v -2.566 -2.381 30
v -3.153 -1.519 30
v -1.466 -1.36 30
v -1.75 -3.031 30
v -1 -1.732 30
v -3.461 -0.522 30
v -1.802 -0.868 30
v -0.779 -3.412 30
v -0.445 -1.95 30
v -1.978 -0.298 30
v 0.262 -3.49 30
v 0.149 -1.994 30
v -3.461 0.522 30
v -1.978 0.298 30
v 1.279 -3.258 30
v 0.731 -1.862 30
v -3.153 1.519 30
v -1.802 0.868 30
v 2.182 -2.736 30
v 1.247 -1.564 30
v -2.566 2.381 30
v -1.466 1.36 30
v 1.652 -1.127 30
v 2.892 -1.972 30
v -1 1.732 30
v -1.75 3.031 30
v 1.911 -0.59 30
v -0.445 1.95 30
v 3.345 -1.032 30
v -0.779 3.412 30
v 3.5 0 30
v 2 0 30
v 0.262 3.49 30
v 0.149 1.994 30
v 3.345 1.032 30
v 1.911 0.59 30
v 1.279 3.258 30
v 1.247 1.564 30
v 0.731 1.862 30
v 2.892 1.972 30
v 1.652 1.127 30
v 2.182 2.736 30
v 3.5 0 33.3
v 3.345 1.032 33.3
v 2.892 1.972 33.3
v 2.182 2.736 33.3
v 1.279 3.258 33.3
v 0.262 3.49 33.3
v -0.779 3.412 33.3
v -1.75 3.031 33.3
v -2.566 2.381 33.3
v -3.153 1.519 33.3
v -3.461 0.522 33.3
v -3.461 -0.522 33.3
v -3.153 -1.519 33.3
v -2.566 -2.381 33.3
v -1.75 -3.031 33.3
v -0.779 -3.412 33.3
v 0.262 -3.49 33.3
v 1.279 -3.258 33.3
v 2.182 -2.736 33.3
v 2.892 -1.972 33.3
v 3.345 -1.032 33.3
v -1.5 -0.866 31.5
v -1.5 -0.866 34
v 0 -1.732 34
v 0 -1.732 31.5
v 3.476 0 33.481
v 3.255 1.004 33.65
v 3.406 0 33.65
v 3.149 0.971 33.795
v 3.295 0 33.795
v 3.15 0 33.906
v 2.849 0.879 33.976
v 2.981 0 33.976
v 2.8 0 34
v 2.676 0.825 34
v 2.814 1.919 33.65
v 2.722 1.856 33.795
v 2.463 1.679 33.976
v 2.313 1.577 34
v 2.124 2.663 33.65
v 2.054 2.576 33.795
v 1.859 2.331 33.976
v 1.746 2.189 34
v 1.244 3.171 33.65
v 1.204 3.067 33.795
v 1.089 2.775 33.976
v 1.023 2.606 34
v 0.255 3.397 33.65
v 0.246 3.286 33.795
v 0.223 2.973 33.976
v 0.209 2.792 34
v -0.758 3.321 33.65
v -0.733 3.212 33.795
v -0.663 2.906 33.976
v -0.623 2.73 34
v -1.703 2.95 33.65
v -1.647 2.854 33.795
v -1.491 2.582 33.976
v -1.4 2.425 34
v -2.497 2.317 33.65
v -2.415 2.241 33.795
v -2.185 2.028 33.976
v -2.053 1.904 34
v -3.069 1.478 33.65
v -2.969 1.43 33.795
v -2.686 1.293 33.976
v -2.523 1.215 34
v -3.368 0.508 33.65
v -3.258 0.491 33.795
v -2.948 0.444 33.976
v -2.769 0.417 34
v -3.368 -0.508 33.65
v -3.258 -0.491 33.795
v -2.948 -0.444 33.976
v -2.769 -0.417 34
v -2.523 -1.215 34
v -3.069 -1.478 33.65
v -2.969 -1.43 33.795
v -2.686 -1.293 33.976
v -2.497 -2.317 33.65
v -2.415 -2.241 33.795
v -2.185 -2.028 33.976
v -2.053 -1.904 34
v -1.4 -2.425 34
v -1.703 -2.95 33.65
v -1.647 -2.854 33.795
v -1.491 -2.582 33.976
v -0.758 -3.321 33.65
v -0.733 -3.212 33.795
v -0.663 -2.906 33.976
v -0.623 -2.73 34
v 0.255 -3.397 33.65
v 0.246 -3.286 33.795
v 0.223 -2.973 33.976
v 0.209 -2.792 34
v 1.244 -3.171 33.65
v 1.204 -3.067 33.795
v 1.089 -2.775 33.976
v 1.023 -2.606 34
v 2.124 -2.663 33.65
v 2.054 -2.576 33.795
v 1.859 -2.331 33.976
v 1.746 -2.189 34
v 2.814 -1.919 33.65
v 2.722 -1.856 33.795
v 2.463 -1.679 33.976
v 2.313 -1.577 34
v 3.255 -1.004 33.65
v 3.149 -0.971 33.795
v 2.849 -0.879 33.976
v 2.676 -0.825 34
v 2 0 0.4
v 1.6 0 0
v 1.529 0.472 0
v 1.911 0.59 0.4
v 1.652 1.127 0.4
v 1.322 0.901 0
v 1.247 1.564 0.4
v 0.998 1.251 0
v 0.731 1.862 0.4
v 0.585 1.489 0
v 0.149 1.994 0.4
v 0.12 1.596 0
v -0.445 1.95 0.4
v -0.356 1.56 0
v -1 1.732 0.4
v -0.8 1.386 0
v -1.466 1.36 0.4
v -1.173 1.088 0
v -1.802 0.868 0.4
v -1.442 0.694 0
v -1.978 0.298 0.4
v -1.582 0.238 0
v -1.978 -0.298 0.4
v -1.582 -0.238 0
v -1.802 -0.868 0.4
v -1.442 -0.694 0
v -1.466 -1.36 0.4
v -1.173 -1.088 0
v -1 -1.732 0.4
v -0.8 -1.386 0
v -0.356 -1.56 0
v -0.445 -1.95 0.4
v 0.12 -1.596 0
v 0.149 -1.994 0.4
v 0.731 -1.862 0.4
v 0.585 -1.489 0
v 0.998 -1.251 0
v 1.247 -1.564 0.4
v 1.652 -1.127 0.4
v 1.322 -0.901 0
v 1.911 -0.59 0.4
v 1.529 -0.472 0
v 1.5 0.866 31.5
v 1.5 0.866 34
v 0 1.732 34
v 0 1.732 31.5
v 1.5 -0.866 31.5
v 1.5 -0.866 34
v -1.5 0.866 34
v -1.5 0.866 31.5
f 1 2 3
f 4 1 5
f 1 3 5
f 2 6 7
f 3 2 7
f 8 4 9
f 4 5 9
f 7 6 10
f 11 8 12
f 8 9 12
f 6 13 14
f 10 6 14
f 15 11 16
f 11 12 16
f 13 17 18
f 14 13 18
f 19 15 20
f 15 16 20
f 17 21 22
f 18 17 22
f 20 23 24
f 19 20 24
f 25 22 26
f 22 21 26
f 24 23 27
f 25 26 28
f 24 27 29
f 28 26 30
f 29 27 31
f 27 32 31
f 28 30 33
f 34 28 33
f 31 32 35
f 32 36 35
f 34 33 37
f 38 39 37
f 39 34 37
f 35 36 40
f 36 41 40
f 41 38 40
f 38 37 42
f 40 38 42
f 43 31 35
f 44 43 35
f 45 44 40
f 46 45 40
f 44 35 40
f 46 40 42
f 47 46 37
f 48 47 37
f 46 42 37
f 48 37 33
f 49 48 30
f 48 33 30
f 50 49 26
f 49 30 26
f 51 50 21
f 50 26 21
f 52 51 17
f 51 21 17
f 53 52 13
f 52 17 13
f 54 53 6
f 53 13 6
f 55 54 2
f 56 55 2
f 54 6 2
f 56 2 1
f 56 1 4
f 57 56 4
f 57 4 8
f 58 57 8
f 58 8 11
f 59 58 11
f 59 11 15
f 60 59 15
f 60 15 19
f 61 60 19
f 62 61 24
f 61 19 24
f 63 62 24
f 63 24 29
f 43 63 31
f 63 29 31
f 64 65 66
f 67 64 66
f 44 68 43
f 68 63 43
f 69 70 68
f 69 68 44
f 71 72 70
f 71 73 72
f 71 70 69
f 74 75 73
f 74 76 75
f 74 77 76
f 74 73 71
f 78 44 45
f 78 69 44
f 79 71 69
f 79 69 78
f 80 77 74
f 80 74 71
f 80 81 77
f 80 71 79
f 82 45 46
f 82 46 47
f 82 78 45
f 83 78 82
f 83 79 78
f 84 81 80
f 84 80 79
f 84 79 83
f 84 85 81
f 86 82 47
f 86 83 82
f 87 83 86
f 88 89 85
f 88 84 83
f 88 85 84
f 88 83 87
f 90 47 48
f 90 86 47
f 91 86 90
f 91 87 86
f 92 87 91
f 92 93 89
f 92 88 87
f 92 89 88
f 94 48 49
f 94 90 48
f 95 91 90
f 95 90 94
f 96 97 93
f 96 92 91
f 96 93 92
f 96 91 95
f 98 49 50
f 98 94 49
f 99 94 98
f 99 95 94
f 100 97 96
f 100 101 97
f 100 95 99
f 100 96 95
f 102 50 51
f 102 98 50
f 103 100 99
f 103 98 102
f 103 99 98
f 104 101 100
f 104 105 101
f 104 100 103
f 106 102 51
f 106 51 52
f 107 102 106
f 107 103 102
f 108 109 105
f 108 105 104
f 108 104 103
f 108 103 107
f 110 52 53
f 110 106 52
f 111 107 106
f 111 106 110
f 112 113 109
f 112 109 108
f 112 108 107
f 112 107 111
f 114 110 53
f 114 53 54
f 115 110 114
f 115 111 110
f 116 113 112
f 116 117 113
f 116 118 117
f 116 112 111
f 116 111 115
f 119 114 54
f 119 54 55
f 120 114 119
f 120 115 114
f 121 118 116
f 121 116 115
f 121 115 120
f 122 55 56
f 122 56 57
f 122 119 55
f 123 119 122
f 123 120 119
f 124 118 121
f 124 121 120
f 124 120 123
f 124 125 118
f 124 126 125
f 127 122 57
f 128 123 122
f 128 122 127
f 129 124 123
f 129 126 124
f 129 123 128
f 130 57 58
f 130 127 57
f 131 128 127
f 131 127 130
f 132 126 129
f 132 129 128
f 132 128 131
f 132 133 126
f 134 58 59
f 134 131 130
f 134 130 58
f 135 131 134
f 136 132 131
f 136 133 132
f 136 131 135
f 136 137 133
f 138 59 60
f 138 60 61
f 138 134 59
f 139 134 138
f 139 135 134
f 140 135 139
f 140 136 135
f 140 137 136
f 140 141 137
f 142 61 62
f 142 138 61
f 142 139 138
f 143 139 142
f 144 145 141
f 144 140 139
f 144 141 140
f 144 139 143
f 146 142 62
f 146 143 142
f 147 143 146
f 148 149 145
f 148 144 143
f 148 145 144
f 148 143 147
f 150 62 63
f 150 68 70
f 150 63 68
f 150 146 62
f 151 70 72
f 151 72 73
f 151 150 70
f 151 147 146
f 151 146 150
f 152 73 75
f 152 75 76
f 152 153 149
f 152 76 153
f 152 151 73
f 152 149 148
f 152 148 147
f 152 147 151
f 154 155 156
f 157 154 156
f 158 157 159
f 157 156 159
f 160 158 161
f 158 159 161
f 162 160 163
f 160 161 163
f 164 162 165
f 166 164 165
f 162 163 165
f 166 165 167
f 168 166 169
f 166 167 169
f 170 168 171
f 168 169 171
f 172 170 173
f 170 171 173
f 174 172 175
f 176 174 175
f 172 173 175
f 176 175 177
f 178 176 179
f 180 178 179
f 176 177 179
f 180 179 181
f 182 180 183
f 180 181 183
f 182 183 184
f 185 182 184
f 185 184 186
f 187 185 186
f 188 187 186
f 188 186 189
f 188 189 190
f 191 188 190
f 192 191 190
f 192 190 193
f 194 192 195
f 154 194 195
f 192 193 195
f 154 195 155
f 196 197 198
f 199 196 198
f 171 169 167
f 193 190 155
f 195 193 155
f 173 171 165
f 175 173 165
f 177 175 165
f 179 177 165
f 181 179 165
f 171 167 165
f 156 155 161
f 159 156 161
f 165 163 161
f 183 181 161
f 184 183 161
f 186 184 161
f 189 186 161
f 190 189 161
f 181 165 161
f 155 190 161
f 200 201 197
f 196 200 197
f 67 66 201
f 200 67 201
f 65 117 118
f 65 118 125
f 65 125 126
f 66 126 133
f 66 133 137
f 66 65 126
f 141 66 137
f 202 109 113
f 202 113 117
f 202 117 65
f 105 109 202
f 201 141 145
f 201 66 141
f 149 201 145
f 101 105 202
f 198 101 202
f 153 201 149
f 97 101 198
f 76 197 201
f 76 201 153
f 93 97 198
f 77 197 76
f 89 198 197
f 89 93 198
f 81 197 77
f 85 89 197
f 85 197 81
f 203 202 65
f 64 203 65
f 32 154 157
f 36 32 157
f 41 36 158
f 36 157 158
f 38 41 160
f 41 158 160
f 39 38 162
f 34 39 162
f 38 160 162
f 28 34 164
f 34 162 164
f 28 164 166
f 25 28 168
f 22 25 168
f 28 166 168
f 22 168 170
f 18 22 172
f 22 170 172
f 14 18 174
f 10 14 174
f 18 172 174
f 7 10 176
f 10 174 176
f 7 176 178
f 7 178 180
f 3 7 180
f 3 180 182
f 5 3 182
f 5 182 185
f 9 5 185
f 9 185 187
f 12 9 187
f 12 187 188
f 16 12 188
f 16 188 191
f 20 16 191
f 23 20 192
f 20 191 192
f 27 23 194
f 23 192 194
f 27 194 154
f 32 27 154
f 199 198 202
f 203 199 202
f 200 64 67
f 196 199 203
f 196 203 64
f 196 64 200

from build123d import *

# Parameters (mm, degrees)
ESQUISSE1_R             = 2
BASE_EXTRUSION_DEPTH    = 30
ESQUISSE2_R             = 3.5
BOSS_EXTRU_1_DEPTH      = 4
CHANFREIN1_SIZE         = 0.4
CONG_1_R                = 0.7
ENL_V_MAT_EXTRU_1_DEPTH = 2.5


with BuildPart() as part:
    # Esquisse1 → Base-Extrusion (new body)
    with BuildSketch(Plane.XY):
        Circle(ESQUISSE1_R)
    extrude(amount=BASE_EXTRUSION_DEPTH)

    # Esquisse2 → Boss.-Extru.1 (add)
    with BuildSketch(Plane.XY.offset(30)):
        Circle(ESQUISSE2_R)
    extrude(amount=BOSS_EXTRU_1_DEPTH)

    # Chanfrein1
    chanfrein1_edges = [part.edges().sort_by_distance(p)[0] for p in [
        (-2, 0, 0),
    ]]
    chamfer(chanfrein1_edges, length=CHANFREIN1_SIZE)

    # Congé1
    cong_1_edges = [part.edges().sort_by_distance(p)[0] for p in [
        (-3.5, 0, 34),
    ]]
    fillet(cong_1_edges, radius=CONG_1_R)

    # Esquisse3 → Enlèv. mat.-Extru.1 (cut)
    with BuildSketch(Plane.XY.offset(34)):
        Polygon((0, 1.732050808), (-1.5, 0.866025404), (-1.5, -0.866025404), (0, -1.732050808), (1.5, -0.866025404), (1.5, 0.866025404), align=None)
    extrude(amount=-ENL_V_MAT_EXTRU_1_DEPTH, mode=Mode.SUBTRACT)


solid = part.part
